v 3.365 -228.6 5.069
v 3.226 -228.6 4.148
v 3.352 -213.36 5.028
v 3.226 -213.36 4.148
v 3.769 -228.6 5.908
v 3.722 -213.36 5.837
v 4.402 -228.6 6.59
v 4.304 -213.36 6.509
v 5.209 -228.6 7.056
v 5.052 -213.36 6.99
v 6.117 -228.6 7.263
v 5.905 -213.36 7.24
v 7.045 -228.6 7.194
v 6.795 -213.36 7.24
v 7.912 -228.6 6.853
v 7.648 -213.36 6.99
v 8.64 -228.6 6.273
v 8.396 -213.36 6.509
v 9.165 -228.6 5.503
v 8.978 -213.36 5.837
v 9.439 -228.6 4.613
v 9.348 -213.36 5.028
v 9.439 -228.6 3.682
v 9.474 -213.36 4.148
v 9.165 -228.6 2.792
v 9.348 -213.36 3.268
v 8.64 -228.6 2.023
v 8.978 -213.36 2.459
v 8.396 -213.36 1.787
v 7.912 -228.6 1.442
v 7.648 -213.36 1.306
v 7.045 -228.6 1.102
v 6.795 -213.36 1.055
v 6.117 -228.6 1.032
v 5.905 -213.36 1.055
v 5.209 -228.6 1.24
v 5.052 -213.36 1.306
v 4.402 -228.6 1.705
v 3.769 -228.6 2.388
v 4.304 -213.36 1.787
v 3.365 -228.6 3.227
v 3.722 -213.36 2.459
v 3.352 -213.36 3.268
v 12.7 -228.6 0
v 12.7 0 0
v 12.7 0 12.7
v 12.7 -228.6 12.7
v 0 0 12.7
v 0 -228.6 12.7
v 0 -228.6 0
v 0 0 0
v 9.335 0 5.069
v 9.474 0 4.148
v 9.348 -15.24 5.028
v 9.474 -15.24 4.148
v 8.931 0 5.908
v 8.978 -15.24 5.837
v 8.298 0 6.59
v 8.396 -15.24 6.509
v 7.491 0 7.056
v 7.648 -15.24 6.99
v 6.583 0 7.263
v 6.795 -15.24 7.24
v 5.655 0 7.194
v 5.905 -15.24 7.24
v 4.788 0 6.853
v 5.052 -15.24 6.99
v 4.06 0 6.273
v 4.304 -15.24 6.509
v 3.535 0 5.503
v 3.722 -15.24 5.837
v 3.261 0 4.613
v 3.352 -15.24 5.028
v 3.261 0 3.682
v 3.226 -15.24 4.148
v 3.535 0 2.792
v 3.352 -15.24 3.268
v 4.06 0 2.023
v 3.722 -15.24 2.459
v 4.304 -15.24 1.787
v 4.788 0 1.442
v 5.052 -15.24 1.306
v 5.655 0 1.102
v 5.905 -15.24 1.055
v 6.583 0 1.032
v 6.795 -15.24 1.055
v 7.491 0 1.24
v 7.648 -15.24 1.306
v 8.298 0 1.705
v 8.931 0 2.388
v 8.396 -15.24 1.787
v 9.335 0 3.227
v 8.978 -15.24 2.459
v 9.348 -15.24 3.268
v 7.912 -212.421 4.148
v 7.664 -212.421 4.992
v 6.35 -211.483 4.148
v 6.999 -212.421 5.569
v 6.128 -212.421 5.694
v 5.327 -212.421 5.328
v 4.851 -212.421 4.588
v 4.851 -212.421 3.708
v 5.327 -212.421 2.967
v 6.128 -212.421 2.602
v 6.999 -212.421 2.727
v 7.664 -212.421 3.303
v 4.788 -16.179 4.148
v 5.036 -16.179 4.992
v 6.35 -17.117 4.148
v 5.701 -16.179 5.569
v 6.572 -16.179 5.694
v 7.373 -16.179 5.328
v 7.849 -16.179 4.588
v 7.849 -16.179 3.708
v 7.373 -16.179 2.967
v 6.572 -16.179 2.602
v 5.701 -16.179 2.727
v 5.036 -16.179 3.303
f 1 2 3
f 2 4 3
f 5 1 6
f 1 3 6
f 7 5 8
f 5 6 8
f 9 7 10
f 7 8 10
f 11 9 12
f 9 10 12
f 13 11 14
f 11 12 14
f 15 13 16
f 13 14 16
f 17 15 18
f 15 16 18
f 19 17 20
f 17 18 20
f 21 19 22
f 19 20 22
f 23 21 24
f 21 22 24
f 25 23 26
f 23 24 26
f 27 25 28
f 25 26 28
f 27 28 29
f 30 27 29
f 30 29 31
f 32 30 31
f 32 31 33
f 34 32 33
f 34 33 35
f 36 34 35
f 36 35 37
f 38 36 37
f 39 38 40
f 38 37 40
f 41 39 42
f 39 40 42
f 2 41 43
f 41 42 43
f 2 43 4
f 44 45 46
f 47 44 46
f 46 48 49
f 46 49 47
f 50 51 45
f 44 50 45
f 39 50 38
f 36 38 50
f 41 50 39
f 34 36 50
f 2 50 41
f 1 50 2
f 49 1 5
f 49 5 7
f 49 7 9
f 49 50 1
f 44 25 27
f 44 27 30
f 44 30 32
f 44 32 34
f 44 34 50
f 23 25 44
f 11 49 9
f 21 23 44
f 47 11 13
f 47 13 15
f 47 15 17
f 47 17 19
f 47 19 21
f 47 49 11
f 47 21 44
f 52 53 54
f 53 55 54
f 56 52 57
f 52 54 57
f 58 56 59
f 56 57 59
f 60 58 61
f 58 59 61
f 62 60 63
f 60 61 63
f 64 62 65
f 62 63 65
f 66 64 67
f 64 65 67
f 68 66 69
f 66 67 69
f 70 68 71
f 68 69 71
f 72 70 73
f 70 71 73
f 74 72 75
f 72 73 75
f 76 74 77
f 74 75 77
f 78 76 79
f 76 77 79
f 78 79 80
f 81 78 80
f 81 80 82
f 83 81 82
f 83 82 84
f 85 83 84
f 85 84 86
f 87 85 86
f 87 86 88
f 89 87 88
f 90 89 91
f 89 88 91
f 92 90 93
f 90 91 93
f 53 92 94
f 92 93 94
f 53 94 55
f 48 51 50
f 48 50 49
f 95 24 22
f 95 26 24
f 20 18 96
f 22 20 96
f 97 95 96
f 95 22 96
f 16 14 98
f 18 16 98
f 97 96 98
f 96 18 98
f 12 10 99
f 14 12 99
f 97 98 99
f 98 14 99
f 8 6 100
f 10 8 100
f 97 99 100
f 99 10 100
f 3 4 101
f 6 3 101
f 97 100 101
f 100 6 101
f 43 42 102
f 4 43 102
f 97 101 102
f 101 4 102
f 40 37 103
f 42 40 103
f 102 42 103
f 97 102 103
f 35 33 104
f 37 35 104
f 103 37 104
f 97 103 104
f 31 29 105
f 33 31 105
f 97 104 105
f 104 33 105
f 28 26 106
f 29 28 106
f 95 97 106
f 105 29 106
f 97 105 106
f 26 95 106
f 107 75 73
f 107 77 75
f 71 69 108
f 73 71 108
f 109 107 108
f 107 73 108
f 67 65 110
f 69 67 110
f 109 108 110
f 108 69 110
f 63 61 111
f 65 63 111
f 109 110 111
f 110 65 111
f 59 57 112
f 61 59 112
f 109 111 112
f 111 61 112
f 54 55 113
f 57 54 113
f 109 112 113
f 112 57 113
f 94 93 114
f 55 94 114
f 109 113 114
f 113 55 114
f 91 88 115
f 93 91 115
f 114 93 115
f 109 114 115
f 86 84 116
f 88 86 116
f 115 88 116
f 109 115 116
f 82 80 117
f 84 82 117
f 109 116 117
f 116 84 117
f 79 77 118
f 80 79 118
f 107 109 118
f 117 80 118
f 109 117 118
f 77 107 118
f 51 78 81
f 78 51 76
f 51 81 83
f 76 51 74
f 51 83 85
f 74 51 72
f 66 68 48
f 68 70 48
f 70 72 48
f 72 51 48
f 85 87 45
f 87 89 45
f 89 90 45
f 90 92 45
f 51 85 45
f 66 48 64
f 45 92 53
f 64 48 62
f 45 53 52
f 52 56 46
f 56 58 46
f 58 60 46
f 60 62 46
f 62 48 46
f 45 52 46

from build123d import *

# Parameters (mm, degrees)
F0_W     = 12.7
F0_H     = 12.7
F1_DEPTH = 228.6
F3_D     = 6.2484
F3_DEPTH = 15.24
F3_TIP   = 1.877208746
F5_D     = 6.2484
F5_DEPTH = 15.24
F5_TIP   = 1.877208746


with BuildPart() as f1:
    # F0 (on Front) → F1 (new body)
    with BuildSketch(Plane.XZ):
        with Locations((6.35, 6.35)):
            Rectangle(F0_W, F0_H)
    extrude(amount=F1_DEPTH)

    # F3
    with Locations(Plane.XZ.offset(228.6)):
        with Locations((6.35, 4.14782)):
            Hole(F3_D / 2, depth=F3_DEPTH)
            with Locations((0, 0, -(F3_DEPTH + F3_TIP / 2))):  # 118° drill point
                Cone(0, F3_D / 2, F3_TIP, mode=Mode.SUBTRACT)

    # F5
    with Locations(Plane(origin=(0, 0, 0), x_dir=(-1, 0, 0), z_dir=(0, 1, 0))):
        with Locations((-6.35, 4.14782)):
            Hole(F5_D / 2, depth=F5_DEPTH)
            with Locations((0, 0, -(F5_DEPTH + F5_TIP / 2))):  # 118° drill point
                Cone(0, F5_D / 2, F5_TIP, mode=Mode.SUBTRACT)


solid = f1.part
